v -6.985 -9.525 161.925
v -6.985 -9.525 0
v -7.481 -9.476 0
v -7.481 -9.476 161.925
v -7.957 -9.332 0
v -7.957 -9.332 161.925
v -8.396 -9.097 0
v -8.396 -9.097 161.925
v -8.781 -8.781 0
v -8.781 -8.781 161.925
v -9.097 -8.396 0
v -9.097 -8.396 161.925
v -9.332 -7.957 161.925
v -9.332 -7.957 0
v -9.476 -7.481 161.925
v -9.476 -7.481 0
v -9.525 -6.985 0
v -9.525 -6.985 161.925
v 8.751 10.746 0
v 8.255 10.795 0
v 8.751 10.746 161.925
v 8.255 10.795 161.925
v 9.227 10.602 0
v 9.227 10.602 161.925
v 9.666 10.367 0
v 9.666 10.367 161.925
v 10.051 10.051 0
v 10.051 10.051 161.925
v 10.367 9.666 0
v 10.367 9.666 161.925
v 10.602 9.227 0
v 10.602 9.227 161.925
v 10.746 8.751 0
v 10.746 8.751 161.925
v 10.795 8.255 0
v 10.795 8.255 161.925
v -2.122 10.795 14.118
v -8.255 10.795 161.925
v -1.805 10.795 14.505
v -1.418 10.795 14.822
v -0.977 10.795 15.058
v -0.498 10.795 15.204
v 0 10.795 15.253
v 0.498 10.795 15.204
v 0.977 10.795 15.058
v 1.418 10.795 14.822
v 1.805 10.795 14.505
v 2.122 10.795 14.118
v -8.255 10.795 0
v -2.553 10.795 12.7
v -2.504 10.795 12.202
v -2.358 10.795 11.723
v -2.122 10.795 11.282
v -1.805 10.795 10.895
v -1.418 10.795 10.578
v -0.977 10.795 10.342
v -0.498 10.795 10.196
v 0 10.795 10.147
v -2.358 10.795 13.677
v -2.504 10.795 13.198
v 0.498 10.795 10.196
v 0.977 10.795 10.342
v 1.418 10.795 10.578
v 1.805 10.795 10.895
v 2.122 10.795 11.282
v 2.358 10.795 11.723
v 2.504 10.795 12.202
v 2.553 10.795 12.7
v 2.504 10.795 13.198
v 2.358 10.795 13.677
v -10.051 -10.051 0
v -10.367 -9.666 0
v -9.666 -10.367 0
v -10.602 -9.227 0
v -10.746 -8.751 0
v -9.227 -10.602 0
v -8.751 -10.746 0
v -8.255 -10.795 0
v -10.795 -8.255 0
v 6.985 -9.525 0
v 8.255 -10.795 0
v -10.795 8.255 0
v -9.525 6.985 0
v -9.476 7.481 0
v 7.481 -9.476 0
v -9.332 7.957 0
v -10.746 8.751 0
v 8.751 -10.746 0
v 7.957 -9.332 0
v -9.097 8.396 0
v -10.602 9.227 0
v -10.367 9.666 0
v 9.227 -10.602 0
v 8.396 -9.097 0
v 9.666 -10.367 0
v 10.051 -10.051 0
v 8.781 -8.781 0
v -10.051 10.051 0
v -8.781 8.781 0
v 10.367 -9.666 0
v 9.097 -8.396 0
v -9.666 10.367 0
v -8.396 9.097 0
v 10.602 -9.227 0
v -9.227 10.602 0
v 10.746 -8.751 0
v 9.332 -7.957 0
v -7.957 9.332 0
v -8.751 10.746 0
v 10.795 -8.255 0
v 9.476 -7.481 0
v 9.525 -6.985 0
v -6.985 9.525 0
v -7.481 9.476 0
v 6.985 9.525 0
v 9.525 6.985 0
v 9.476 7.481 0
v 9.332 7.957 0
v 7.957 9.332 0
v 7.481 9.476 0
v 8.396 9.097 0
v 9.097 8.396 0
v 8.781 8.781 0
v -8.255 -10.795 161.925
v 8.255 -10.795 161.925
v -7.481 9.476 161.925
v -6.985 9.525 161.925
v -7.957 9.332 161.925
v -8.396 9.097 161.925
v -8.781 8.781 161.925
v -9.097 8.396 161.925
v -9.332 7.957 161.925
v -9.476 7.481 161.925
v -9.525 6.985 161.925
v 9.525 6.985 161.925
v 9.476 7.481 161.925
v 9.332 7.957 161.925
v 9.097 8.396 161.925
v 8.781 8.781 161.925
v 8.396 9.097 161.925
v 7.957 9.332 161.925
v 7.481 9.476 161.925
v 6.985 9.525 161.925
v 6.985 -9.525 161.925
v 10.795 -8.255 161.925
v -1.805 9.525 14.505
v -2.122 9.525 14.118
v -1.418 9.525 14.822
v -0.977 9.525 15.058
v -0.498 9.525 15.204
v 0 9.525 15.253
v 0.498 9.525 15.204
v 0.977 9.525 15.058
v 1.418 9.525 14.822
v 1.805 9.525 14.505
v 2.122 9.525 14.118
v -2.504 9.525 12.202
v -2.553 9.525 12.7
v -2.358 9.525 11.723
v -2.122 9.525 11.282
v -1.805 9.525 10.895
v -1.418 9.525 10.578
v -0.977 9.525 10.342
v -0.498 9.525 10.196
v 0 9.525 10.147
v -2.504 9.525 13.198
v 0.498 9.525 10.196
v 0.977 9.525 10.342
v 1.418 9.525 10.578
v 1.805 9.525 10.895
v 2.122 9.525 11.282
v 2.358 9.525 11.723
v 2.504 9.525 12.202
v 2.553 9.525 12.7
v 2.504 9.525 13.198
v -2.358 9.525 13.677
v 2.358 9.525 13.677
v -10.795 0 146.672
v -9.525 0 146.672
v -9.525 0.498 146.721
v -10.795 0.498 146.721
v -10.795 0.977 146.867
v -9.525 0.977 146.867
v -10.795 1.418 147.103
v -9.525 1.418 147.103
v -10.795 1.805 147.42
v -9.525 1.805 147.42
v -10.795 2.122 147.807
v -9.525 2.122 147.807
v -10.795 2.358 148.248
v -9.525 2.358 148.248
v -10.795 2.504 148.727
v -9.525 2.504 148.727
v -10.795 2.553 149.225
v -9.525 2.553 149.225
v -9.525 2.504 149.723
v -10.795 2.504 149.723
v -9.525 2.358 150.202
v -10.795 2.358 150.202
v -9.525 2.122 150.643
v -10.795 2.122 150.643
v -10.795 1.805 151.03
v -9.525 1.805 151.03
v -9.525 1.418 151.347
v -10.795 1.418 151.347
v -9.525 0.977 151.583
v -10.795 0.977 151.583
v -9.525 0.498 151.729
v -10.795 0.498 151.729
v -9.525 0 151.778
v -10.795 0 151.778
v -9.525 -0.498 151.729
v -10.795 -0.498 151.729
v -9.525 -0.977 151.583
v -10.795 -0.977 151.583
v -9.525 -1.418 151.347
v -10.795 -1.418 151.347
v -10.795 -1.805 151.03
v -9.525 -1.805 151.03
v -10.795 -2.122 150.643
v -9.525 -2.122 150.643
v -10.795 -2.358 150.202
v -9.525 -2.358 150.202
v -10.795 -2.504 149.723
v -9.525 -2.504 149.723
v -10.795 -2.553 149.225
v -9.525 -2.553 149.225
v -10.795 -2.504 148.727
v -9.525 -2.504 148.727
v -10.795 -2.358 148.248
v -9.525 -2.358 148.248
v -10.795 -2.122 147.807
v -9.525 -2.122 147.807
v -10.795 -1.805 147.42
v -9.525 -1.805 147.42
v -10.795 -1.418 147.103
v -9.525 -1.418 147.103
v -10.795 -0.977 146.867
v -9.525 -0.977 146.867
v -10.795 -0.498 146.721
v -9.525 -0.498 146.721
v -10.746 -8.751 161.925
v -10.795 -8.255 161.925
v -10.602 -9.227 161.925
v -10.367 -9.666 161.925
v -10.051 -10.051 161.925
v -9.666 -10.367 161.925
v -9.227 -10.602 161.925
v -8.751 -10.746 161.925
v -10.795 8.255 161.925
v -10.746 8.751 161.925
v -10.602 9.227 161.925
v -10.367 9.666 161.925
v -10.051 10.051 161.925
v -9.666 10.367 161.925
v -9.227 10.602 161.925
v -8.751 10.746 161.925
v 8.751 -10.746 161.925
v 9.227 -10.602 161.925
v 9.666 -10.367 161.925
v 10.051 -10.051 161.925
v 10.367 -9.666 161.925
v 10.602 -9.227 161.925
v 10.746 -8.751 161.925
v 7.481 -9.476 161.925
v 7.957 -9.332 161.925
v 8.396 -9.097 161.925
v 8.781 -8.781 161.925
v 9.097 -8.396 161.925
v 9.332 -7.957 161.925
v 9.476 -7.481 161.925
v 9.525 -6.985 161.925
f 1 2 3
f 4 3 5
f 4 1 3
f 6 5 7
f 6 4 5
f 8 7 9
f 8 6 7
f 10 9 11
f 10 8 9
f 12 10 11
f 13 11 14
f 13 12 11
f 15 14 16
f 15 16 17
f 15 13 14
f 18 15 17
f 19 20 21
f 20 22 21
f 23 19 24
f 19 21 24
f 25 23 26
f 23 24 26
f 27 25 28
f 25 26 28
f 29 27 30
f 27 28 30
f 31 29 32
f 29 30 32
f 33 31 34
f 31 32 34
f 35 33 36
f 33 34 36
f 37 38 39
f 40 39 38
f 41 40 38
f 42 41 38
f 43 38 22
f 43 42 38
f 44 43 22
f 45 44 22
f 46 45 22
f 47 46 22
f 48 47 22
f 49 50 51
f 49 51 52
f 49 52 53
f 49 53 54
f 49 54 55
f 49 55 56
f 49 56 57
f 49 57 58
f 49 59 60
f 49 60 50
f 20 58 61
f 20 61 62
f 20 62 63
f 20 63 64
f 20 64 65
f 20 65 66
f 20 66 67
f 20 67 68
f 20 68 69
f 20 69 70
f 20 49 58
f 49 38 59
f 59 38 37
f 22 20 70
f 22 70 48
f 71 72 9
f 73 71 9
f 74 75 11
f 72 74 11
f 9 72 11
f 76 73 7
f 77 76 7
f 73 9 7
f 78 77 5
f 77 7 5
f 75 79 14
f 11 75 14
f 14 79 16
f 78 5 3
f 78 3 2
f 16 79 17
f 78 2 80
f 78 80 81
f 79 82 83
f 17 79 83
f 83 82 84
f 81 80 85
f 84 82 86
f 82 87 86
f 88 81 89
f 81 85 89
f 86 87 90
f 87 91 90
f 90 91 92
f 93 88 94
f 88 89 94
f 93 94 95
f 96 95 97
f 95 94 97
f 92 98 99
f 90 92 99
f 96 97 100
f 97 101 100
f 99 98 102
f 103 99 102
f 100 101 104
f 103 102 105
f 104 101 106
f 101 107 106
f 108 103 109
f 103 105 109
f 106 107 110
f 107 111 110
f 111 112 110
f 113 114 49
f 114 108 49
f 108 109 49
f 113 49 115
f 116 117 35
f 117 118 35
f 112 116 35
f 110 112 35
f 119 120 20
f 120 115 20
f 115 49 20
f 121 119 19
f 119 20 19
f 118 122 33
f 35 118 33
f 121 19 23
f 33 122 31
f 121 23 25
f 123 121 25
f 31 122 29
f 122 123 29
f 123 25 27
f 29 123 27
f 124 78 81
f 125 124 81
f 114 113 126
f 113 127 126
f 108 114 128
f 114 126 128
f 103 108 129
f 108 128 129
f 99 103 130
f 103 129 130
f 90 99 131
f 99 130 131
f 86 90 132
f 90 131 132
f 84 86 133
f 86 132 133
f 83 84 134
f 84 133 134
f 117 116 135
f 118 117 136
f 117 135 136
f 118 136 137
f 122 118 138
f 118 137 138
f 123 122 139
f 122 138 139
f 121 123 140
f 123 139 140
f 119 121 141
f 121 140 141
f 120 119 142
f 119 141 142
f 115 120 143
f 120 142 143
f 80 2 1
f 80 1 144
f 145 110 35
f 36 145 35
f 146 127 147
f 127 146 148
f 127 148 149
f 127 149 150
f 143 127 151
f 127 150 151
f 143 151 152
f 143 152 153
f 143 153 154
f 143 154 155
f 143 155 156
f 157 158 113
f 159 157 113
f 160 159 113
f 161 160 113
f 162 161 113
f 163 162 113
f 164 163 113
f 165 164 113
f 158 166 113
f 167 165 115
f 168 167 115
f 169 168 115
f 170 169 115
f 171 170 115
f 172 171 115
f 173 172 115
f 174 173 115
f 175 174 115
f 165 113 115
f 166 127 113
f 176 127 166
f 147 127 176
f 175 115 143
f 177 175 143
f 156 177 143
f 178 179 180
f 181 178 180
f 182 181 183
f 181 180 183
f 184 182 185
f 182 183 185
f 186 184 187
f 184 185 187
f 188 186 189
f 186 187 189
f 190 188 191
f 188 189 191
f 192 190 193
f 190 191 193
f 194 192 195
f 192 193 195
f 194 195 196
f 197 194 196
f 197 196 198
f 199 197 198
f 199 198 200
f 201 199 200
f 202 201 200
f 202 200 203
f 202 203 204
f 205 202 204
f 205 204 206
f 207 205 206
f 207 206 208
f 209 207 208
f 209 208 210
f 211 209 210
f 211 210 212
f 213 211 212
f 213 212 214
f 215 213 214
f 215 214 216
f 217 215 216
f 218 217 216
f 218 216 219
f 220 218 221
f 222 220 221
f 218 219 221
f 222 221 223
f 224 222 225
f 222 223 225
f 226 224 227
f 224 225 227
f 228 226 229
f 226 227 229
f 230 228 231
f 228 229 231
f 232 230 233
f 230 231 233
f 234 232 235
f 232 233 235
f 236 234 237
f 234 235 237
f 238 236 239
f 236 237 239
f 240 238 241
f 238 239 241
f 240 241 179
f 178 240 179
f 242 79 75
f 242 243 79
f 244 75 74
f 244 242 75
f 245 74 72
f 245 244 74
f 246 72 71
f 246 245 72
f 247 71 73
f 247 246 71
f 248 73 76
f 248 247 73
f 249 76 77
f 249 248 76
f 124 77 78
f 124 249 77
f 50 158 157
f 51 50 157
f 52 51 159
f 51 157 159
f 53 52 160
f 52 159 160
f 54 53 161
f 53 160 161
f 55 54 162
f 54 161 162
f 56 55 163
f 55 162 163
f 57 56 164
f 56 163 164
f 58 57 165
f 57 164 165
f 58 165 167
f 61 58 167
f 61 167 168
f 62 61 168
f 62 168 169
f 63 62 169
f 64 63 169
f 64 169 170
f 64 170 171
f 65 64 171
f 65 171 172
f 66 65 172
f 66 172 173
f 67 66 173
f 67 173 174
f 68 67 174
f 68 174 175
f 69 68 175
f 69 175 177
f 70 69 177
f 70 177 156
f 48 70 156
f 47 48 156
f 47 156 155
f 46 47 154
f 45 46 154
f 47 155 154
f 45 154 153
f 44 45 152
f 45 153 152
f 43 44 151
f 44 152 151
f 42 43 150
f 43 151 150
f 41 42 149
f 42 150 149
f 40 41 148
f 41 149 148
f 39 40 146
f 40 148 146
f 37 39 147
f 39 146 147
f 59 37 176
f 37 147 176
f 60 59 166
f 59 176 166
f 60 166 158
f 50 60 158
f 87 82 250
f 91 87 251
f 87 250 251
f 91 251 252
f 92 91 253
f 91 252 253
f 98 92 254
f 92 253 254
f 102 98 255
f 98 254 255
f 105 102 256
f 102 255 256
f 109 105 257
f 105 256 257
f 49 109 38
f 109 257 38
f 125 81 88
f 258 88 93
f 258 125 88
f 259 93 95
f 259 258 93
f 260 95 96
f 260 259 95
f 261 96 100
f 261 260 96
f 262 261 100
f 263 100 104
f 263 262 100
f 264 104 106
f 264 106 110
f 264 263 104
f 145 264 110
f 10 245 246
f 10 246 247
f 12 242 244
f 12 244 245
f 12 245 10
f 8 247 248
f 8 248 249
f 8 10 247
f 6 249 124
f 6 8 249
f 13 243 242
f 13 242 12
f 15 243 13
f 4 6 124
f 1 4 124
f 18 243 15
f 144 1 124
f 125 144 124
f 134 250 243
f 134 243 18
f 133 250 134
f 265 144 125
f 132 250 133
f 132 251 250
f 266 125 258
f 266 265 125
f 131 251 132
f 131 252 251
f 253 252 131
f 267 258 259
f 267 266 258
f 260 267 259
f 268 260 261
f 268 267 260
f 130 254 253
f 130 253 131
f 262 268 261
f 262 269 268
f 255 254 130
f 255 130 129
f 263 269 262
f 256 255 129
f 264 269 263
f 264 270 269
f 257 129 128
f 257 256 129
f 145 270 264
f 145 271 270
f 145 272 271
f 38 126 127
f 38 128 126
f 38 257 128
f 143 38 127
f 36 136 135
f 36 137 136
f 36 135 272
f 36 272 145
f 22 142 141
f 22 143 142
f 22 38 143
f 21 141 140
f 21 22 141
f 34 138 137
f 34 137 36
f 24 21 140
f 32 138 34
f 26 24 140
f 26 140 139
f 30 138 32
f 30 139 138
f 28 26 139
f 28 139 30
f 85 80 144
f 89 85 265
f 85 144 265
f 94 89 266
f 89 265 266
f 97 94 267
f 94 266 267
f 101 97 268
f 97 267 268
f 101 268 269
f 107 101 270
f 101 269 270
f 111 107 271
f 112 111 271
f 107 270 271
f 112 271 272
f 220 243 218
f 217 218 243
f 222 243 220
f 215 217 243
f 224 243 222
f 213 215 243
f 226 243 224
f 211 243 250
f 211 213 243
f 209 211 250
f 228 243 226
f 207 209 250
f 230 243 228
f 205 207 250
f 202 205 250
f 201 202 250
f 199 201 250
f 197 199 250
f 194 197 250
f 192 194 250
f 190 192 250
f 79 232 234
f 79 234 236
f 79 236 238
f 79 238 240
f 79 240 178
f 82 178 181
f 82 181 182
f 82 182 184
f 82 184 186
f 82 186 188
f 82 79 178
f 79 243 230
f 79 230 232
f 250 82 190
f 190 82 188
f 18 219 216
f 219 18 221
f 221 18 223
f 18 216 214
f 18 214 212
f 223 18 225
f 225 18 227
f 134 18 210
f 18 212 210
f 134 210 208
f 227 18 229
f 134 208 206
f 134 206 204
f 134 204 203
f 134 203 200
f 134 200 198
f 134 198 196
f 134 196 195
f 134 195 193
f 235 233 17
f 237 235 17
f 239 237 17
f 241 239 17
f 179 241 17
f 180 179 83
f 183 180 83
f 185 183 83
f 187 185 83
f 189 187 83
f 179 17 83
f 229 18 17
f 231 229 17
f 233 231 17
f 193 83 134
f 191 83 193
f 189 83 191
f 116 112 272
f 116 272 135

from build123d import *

# Parameters (mm, degrees)
SKETCH4_W                  = 21.59
SKETCH4_H                  = 21.59
SKETCH4_W_2                = 19.05
SKETCH4_H_2                = 19.05
BOSS_EXTRUDE2_DEPTH        = 161.925
FILLET1_R                  = 2.54
F_10_CLEARANCE_HOLE1_D     = 5.1054
F_10_CLEARANCE_HOLE1_DEPTH = 12.7
F_10_CLEARANCE_HOLE1_TIP   = 1.533816902
F_10_CLEARANCE_HOLE2_D     = 5.1054
F_10_CLEARANCE_HOLE2_DEPTH = 12.7
F_10_CLEARANCE_HOLE2_TIP   = 1.533816902


with BuildPart() as part:
    # Sketch4 → Boss-Extrude2 (new body)
    with BuildSketch(Plane.XY):
        Rectangle(SKETCH4_W, SKETCH4_H)
        Rectangle(SKETCH4_W_2, SKETCH4_H_2, mode=Mode.SUBTRACT)
    extrude(amount=BOSS_EXTRUDE2_DEPTH)

    # Fillet1
    fillet1_edges = [part.edges().sort_by_distance(p)[0] for p in [
        (-9.525, 9.525, 80.9625),
        (-9.525, -9.525, 80.9625),
        (9.525, -9.525, 80.9625),
        (9.525, 9.525, 80.9625),
        (-10.795, 10.795, 80.9625),
        (10.795, 10.795, 80.9625),
        (10.795, -10.795, 80.9625),
        (-10.795, -10.795, 80.9625),
    ]]
    fillet(fillet1_edges, radius=FILLET1_R)

    # #10 Clearance Hole1
    with Locations(Plane(origin=(0, 10.795, 0), x_dir=(1, 0, 0), z_dir=(0, 1, 0))):
        with Locations((0, -12.7)):
            Hole(F_10_CLEARANCE_HOLE1_D / 2, depth=F_10_CLEARANCE_HOLE1_DEPTH)
            with Locations((0, 0, -(F_10_CLEARANCE_HOLE1_DEPTH + F_10_CLEARANCE_HOLE1_TIP / 2))):  # 118° drill point
                Cone(0, F_10_CLEARANCE_HOLE1_D / 2, F_10_CLEARANCE_HOLE1_TIP, mode=Mode.SUBTRACT)

    # #10 Clearance Hole2
    with Locations(Plane.ZY.offset(10.795)):
        with Locations((149.225, 0)):
            Hole(F_10_CLEARANCE_HOLE2_D / 2, depth=F_10_CLEARANCE_HOLE2_DEPTH)
            with Locations((0, 0, -(F_10_CLEARANCE_HOLE2_DEPTH + F_10_CLEARANCE_HOLE2_TIP / 2))):  # 118° drill point
                Cone(0, F_10_CLEARANCE_HOLE2_D / 2, F_10_CLEARANCE_HOLE2_TIP, mode=Mode.SUBTRACT)


solid = part.part
